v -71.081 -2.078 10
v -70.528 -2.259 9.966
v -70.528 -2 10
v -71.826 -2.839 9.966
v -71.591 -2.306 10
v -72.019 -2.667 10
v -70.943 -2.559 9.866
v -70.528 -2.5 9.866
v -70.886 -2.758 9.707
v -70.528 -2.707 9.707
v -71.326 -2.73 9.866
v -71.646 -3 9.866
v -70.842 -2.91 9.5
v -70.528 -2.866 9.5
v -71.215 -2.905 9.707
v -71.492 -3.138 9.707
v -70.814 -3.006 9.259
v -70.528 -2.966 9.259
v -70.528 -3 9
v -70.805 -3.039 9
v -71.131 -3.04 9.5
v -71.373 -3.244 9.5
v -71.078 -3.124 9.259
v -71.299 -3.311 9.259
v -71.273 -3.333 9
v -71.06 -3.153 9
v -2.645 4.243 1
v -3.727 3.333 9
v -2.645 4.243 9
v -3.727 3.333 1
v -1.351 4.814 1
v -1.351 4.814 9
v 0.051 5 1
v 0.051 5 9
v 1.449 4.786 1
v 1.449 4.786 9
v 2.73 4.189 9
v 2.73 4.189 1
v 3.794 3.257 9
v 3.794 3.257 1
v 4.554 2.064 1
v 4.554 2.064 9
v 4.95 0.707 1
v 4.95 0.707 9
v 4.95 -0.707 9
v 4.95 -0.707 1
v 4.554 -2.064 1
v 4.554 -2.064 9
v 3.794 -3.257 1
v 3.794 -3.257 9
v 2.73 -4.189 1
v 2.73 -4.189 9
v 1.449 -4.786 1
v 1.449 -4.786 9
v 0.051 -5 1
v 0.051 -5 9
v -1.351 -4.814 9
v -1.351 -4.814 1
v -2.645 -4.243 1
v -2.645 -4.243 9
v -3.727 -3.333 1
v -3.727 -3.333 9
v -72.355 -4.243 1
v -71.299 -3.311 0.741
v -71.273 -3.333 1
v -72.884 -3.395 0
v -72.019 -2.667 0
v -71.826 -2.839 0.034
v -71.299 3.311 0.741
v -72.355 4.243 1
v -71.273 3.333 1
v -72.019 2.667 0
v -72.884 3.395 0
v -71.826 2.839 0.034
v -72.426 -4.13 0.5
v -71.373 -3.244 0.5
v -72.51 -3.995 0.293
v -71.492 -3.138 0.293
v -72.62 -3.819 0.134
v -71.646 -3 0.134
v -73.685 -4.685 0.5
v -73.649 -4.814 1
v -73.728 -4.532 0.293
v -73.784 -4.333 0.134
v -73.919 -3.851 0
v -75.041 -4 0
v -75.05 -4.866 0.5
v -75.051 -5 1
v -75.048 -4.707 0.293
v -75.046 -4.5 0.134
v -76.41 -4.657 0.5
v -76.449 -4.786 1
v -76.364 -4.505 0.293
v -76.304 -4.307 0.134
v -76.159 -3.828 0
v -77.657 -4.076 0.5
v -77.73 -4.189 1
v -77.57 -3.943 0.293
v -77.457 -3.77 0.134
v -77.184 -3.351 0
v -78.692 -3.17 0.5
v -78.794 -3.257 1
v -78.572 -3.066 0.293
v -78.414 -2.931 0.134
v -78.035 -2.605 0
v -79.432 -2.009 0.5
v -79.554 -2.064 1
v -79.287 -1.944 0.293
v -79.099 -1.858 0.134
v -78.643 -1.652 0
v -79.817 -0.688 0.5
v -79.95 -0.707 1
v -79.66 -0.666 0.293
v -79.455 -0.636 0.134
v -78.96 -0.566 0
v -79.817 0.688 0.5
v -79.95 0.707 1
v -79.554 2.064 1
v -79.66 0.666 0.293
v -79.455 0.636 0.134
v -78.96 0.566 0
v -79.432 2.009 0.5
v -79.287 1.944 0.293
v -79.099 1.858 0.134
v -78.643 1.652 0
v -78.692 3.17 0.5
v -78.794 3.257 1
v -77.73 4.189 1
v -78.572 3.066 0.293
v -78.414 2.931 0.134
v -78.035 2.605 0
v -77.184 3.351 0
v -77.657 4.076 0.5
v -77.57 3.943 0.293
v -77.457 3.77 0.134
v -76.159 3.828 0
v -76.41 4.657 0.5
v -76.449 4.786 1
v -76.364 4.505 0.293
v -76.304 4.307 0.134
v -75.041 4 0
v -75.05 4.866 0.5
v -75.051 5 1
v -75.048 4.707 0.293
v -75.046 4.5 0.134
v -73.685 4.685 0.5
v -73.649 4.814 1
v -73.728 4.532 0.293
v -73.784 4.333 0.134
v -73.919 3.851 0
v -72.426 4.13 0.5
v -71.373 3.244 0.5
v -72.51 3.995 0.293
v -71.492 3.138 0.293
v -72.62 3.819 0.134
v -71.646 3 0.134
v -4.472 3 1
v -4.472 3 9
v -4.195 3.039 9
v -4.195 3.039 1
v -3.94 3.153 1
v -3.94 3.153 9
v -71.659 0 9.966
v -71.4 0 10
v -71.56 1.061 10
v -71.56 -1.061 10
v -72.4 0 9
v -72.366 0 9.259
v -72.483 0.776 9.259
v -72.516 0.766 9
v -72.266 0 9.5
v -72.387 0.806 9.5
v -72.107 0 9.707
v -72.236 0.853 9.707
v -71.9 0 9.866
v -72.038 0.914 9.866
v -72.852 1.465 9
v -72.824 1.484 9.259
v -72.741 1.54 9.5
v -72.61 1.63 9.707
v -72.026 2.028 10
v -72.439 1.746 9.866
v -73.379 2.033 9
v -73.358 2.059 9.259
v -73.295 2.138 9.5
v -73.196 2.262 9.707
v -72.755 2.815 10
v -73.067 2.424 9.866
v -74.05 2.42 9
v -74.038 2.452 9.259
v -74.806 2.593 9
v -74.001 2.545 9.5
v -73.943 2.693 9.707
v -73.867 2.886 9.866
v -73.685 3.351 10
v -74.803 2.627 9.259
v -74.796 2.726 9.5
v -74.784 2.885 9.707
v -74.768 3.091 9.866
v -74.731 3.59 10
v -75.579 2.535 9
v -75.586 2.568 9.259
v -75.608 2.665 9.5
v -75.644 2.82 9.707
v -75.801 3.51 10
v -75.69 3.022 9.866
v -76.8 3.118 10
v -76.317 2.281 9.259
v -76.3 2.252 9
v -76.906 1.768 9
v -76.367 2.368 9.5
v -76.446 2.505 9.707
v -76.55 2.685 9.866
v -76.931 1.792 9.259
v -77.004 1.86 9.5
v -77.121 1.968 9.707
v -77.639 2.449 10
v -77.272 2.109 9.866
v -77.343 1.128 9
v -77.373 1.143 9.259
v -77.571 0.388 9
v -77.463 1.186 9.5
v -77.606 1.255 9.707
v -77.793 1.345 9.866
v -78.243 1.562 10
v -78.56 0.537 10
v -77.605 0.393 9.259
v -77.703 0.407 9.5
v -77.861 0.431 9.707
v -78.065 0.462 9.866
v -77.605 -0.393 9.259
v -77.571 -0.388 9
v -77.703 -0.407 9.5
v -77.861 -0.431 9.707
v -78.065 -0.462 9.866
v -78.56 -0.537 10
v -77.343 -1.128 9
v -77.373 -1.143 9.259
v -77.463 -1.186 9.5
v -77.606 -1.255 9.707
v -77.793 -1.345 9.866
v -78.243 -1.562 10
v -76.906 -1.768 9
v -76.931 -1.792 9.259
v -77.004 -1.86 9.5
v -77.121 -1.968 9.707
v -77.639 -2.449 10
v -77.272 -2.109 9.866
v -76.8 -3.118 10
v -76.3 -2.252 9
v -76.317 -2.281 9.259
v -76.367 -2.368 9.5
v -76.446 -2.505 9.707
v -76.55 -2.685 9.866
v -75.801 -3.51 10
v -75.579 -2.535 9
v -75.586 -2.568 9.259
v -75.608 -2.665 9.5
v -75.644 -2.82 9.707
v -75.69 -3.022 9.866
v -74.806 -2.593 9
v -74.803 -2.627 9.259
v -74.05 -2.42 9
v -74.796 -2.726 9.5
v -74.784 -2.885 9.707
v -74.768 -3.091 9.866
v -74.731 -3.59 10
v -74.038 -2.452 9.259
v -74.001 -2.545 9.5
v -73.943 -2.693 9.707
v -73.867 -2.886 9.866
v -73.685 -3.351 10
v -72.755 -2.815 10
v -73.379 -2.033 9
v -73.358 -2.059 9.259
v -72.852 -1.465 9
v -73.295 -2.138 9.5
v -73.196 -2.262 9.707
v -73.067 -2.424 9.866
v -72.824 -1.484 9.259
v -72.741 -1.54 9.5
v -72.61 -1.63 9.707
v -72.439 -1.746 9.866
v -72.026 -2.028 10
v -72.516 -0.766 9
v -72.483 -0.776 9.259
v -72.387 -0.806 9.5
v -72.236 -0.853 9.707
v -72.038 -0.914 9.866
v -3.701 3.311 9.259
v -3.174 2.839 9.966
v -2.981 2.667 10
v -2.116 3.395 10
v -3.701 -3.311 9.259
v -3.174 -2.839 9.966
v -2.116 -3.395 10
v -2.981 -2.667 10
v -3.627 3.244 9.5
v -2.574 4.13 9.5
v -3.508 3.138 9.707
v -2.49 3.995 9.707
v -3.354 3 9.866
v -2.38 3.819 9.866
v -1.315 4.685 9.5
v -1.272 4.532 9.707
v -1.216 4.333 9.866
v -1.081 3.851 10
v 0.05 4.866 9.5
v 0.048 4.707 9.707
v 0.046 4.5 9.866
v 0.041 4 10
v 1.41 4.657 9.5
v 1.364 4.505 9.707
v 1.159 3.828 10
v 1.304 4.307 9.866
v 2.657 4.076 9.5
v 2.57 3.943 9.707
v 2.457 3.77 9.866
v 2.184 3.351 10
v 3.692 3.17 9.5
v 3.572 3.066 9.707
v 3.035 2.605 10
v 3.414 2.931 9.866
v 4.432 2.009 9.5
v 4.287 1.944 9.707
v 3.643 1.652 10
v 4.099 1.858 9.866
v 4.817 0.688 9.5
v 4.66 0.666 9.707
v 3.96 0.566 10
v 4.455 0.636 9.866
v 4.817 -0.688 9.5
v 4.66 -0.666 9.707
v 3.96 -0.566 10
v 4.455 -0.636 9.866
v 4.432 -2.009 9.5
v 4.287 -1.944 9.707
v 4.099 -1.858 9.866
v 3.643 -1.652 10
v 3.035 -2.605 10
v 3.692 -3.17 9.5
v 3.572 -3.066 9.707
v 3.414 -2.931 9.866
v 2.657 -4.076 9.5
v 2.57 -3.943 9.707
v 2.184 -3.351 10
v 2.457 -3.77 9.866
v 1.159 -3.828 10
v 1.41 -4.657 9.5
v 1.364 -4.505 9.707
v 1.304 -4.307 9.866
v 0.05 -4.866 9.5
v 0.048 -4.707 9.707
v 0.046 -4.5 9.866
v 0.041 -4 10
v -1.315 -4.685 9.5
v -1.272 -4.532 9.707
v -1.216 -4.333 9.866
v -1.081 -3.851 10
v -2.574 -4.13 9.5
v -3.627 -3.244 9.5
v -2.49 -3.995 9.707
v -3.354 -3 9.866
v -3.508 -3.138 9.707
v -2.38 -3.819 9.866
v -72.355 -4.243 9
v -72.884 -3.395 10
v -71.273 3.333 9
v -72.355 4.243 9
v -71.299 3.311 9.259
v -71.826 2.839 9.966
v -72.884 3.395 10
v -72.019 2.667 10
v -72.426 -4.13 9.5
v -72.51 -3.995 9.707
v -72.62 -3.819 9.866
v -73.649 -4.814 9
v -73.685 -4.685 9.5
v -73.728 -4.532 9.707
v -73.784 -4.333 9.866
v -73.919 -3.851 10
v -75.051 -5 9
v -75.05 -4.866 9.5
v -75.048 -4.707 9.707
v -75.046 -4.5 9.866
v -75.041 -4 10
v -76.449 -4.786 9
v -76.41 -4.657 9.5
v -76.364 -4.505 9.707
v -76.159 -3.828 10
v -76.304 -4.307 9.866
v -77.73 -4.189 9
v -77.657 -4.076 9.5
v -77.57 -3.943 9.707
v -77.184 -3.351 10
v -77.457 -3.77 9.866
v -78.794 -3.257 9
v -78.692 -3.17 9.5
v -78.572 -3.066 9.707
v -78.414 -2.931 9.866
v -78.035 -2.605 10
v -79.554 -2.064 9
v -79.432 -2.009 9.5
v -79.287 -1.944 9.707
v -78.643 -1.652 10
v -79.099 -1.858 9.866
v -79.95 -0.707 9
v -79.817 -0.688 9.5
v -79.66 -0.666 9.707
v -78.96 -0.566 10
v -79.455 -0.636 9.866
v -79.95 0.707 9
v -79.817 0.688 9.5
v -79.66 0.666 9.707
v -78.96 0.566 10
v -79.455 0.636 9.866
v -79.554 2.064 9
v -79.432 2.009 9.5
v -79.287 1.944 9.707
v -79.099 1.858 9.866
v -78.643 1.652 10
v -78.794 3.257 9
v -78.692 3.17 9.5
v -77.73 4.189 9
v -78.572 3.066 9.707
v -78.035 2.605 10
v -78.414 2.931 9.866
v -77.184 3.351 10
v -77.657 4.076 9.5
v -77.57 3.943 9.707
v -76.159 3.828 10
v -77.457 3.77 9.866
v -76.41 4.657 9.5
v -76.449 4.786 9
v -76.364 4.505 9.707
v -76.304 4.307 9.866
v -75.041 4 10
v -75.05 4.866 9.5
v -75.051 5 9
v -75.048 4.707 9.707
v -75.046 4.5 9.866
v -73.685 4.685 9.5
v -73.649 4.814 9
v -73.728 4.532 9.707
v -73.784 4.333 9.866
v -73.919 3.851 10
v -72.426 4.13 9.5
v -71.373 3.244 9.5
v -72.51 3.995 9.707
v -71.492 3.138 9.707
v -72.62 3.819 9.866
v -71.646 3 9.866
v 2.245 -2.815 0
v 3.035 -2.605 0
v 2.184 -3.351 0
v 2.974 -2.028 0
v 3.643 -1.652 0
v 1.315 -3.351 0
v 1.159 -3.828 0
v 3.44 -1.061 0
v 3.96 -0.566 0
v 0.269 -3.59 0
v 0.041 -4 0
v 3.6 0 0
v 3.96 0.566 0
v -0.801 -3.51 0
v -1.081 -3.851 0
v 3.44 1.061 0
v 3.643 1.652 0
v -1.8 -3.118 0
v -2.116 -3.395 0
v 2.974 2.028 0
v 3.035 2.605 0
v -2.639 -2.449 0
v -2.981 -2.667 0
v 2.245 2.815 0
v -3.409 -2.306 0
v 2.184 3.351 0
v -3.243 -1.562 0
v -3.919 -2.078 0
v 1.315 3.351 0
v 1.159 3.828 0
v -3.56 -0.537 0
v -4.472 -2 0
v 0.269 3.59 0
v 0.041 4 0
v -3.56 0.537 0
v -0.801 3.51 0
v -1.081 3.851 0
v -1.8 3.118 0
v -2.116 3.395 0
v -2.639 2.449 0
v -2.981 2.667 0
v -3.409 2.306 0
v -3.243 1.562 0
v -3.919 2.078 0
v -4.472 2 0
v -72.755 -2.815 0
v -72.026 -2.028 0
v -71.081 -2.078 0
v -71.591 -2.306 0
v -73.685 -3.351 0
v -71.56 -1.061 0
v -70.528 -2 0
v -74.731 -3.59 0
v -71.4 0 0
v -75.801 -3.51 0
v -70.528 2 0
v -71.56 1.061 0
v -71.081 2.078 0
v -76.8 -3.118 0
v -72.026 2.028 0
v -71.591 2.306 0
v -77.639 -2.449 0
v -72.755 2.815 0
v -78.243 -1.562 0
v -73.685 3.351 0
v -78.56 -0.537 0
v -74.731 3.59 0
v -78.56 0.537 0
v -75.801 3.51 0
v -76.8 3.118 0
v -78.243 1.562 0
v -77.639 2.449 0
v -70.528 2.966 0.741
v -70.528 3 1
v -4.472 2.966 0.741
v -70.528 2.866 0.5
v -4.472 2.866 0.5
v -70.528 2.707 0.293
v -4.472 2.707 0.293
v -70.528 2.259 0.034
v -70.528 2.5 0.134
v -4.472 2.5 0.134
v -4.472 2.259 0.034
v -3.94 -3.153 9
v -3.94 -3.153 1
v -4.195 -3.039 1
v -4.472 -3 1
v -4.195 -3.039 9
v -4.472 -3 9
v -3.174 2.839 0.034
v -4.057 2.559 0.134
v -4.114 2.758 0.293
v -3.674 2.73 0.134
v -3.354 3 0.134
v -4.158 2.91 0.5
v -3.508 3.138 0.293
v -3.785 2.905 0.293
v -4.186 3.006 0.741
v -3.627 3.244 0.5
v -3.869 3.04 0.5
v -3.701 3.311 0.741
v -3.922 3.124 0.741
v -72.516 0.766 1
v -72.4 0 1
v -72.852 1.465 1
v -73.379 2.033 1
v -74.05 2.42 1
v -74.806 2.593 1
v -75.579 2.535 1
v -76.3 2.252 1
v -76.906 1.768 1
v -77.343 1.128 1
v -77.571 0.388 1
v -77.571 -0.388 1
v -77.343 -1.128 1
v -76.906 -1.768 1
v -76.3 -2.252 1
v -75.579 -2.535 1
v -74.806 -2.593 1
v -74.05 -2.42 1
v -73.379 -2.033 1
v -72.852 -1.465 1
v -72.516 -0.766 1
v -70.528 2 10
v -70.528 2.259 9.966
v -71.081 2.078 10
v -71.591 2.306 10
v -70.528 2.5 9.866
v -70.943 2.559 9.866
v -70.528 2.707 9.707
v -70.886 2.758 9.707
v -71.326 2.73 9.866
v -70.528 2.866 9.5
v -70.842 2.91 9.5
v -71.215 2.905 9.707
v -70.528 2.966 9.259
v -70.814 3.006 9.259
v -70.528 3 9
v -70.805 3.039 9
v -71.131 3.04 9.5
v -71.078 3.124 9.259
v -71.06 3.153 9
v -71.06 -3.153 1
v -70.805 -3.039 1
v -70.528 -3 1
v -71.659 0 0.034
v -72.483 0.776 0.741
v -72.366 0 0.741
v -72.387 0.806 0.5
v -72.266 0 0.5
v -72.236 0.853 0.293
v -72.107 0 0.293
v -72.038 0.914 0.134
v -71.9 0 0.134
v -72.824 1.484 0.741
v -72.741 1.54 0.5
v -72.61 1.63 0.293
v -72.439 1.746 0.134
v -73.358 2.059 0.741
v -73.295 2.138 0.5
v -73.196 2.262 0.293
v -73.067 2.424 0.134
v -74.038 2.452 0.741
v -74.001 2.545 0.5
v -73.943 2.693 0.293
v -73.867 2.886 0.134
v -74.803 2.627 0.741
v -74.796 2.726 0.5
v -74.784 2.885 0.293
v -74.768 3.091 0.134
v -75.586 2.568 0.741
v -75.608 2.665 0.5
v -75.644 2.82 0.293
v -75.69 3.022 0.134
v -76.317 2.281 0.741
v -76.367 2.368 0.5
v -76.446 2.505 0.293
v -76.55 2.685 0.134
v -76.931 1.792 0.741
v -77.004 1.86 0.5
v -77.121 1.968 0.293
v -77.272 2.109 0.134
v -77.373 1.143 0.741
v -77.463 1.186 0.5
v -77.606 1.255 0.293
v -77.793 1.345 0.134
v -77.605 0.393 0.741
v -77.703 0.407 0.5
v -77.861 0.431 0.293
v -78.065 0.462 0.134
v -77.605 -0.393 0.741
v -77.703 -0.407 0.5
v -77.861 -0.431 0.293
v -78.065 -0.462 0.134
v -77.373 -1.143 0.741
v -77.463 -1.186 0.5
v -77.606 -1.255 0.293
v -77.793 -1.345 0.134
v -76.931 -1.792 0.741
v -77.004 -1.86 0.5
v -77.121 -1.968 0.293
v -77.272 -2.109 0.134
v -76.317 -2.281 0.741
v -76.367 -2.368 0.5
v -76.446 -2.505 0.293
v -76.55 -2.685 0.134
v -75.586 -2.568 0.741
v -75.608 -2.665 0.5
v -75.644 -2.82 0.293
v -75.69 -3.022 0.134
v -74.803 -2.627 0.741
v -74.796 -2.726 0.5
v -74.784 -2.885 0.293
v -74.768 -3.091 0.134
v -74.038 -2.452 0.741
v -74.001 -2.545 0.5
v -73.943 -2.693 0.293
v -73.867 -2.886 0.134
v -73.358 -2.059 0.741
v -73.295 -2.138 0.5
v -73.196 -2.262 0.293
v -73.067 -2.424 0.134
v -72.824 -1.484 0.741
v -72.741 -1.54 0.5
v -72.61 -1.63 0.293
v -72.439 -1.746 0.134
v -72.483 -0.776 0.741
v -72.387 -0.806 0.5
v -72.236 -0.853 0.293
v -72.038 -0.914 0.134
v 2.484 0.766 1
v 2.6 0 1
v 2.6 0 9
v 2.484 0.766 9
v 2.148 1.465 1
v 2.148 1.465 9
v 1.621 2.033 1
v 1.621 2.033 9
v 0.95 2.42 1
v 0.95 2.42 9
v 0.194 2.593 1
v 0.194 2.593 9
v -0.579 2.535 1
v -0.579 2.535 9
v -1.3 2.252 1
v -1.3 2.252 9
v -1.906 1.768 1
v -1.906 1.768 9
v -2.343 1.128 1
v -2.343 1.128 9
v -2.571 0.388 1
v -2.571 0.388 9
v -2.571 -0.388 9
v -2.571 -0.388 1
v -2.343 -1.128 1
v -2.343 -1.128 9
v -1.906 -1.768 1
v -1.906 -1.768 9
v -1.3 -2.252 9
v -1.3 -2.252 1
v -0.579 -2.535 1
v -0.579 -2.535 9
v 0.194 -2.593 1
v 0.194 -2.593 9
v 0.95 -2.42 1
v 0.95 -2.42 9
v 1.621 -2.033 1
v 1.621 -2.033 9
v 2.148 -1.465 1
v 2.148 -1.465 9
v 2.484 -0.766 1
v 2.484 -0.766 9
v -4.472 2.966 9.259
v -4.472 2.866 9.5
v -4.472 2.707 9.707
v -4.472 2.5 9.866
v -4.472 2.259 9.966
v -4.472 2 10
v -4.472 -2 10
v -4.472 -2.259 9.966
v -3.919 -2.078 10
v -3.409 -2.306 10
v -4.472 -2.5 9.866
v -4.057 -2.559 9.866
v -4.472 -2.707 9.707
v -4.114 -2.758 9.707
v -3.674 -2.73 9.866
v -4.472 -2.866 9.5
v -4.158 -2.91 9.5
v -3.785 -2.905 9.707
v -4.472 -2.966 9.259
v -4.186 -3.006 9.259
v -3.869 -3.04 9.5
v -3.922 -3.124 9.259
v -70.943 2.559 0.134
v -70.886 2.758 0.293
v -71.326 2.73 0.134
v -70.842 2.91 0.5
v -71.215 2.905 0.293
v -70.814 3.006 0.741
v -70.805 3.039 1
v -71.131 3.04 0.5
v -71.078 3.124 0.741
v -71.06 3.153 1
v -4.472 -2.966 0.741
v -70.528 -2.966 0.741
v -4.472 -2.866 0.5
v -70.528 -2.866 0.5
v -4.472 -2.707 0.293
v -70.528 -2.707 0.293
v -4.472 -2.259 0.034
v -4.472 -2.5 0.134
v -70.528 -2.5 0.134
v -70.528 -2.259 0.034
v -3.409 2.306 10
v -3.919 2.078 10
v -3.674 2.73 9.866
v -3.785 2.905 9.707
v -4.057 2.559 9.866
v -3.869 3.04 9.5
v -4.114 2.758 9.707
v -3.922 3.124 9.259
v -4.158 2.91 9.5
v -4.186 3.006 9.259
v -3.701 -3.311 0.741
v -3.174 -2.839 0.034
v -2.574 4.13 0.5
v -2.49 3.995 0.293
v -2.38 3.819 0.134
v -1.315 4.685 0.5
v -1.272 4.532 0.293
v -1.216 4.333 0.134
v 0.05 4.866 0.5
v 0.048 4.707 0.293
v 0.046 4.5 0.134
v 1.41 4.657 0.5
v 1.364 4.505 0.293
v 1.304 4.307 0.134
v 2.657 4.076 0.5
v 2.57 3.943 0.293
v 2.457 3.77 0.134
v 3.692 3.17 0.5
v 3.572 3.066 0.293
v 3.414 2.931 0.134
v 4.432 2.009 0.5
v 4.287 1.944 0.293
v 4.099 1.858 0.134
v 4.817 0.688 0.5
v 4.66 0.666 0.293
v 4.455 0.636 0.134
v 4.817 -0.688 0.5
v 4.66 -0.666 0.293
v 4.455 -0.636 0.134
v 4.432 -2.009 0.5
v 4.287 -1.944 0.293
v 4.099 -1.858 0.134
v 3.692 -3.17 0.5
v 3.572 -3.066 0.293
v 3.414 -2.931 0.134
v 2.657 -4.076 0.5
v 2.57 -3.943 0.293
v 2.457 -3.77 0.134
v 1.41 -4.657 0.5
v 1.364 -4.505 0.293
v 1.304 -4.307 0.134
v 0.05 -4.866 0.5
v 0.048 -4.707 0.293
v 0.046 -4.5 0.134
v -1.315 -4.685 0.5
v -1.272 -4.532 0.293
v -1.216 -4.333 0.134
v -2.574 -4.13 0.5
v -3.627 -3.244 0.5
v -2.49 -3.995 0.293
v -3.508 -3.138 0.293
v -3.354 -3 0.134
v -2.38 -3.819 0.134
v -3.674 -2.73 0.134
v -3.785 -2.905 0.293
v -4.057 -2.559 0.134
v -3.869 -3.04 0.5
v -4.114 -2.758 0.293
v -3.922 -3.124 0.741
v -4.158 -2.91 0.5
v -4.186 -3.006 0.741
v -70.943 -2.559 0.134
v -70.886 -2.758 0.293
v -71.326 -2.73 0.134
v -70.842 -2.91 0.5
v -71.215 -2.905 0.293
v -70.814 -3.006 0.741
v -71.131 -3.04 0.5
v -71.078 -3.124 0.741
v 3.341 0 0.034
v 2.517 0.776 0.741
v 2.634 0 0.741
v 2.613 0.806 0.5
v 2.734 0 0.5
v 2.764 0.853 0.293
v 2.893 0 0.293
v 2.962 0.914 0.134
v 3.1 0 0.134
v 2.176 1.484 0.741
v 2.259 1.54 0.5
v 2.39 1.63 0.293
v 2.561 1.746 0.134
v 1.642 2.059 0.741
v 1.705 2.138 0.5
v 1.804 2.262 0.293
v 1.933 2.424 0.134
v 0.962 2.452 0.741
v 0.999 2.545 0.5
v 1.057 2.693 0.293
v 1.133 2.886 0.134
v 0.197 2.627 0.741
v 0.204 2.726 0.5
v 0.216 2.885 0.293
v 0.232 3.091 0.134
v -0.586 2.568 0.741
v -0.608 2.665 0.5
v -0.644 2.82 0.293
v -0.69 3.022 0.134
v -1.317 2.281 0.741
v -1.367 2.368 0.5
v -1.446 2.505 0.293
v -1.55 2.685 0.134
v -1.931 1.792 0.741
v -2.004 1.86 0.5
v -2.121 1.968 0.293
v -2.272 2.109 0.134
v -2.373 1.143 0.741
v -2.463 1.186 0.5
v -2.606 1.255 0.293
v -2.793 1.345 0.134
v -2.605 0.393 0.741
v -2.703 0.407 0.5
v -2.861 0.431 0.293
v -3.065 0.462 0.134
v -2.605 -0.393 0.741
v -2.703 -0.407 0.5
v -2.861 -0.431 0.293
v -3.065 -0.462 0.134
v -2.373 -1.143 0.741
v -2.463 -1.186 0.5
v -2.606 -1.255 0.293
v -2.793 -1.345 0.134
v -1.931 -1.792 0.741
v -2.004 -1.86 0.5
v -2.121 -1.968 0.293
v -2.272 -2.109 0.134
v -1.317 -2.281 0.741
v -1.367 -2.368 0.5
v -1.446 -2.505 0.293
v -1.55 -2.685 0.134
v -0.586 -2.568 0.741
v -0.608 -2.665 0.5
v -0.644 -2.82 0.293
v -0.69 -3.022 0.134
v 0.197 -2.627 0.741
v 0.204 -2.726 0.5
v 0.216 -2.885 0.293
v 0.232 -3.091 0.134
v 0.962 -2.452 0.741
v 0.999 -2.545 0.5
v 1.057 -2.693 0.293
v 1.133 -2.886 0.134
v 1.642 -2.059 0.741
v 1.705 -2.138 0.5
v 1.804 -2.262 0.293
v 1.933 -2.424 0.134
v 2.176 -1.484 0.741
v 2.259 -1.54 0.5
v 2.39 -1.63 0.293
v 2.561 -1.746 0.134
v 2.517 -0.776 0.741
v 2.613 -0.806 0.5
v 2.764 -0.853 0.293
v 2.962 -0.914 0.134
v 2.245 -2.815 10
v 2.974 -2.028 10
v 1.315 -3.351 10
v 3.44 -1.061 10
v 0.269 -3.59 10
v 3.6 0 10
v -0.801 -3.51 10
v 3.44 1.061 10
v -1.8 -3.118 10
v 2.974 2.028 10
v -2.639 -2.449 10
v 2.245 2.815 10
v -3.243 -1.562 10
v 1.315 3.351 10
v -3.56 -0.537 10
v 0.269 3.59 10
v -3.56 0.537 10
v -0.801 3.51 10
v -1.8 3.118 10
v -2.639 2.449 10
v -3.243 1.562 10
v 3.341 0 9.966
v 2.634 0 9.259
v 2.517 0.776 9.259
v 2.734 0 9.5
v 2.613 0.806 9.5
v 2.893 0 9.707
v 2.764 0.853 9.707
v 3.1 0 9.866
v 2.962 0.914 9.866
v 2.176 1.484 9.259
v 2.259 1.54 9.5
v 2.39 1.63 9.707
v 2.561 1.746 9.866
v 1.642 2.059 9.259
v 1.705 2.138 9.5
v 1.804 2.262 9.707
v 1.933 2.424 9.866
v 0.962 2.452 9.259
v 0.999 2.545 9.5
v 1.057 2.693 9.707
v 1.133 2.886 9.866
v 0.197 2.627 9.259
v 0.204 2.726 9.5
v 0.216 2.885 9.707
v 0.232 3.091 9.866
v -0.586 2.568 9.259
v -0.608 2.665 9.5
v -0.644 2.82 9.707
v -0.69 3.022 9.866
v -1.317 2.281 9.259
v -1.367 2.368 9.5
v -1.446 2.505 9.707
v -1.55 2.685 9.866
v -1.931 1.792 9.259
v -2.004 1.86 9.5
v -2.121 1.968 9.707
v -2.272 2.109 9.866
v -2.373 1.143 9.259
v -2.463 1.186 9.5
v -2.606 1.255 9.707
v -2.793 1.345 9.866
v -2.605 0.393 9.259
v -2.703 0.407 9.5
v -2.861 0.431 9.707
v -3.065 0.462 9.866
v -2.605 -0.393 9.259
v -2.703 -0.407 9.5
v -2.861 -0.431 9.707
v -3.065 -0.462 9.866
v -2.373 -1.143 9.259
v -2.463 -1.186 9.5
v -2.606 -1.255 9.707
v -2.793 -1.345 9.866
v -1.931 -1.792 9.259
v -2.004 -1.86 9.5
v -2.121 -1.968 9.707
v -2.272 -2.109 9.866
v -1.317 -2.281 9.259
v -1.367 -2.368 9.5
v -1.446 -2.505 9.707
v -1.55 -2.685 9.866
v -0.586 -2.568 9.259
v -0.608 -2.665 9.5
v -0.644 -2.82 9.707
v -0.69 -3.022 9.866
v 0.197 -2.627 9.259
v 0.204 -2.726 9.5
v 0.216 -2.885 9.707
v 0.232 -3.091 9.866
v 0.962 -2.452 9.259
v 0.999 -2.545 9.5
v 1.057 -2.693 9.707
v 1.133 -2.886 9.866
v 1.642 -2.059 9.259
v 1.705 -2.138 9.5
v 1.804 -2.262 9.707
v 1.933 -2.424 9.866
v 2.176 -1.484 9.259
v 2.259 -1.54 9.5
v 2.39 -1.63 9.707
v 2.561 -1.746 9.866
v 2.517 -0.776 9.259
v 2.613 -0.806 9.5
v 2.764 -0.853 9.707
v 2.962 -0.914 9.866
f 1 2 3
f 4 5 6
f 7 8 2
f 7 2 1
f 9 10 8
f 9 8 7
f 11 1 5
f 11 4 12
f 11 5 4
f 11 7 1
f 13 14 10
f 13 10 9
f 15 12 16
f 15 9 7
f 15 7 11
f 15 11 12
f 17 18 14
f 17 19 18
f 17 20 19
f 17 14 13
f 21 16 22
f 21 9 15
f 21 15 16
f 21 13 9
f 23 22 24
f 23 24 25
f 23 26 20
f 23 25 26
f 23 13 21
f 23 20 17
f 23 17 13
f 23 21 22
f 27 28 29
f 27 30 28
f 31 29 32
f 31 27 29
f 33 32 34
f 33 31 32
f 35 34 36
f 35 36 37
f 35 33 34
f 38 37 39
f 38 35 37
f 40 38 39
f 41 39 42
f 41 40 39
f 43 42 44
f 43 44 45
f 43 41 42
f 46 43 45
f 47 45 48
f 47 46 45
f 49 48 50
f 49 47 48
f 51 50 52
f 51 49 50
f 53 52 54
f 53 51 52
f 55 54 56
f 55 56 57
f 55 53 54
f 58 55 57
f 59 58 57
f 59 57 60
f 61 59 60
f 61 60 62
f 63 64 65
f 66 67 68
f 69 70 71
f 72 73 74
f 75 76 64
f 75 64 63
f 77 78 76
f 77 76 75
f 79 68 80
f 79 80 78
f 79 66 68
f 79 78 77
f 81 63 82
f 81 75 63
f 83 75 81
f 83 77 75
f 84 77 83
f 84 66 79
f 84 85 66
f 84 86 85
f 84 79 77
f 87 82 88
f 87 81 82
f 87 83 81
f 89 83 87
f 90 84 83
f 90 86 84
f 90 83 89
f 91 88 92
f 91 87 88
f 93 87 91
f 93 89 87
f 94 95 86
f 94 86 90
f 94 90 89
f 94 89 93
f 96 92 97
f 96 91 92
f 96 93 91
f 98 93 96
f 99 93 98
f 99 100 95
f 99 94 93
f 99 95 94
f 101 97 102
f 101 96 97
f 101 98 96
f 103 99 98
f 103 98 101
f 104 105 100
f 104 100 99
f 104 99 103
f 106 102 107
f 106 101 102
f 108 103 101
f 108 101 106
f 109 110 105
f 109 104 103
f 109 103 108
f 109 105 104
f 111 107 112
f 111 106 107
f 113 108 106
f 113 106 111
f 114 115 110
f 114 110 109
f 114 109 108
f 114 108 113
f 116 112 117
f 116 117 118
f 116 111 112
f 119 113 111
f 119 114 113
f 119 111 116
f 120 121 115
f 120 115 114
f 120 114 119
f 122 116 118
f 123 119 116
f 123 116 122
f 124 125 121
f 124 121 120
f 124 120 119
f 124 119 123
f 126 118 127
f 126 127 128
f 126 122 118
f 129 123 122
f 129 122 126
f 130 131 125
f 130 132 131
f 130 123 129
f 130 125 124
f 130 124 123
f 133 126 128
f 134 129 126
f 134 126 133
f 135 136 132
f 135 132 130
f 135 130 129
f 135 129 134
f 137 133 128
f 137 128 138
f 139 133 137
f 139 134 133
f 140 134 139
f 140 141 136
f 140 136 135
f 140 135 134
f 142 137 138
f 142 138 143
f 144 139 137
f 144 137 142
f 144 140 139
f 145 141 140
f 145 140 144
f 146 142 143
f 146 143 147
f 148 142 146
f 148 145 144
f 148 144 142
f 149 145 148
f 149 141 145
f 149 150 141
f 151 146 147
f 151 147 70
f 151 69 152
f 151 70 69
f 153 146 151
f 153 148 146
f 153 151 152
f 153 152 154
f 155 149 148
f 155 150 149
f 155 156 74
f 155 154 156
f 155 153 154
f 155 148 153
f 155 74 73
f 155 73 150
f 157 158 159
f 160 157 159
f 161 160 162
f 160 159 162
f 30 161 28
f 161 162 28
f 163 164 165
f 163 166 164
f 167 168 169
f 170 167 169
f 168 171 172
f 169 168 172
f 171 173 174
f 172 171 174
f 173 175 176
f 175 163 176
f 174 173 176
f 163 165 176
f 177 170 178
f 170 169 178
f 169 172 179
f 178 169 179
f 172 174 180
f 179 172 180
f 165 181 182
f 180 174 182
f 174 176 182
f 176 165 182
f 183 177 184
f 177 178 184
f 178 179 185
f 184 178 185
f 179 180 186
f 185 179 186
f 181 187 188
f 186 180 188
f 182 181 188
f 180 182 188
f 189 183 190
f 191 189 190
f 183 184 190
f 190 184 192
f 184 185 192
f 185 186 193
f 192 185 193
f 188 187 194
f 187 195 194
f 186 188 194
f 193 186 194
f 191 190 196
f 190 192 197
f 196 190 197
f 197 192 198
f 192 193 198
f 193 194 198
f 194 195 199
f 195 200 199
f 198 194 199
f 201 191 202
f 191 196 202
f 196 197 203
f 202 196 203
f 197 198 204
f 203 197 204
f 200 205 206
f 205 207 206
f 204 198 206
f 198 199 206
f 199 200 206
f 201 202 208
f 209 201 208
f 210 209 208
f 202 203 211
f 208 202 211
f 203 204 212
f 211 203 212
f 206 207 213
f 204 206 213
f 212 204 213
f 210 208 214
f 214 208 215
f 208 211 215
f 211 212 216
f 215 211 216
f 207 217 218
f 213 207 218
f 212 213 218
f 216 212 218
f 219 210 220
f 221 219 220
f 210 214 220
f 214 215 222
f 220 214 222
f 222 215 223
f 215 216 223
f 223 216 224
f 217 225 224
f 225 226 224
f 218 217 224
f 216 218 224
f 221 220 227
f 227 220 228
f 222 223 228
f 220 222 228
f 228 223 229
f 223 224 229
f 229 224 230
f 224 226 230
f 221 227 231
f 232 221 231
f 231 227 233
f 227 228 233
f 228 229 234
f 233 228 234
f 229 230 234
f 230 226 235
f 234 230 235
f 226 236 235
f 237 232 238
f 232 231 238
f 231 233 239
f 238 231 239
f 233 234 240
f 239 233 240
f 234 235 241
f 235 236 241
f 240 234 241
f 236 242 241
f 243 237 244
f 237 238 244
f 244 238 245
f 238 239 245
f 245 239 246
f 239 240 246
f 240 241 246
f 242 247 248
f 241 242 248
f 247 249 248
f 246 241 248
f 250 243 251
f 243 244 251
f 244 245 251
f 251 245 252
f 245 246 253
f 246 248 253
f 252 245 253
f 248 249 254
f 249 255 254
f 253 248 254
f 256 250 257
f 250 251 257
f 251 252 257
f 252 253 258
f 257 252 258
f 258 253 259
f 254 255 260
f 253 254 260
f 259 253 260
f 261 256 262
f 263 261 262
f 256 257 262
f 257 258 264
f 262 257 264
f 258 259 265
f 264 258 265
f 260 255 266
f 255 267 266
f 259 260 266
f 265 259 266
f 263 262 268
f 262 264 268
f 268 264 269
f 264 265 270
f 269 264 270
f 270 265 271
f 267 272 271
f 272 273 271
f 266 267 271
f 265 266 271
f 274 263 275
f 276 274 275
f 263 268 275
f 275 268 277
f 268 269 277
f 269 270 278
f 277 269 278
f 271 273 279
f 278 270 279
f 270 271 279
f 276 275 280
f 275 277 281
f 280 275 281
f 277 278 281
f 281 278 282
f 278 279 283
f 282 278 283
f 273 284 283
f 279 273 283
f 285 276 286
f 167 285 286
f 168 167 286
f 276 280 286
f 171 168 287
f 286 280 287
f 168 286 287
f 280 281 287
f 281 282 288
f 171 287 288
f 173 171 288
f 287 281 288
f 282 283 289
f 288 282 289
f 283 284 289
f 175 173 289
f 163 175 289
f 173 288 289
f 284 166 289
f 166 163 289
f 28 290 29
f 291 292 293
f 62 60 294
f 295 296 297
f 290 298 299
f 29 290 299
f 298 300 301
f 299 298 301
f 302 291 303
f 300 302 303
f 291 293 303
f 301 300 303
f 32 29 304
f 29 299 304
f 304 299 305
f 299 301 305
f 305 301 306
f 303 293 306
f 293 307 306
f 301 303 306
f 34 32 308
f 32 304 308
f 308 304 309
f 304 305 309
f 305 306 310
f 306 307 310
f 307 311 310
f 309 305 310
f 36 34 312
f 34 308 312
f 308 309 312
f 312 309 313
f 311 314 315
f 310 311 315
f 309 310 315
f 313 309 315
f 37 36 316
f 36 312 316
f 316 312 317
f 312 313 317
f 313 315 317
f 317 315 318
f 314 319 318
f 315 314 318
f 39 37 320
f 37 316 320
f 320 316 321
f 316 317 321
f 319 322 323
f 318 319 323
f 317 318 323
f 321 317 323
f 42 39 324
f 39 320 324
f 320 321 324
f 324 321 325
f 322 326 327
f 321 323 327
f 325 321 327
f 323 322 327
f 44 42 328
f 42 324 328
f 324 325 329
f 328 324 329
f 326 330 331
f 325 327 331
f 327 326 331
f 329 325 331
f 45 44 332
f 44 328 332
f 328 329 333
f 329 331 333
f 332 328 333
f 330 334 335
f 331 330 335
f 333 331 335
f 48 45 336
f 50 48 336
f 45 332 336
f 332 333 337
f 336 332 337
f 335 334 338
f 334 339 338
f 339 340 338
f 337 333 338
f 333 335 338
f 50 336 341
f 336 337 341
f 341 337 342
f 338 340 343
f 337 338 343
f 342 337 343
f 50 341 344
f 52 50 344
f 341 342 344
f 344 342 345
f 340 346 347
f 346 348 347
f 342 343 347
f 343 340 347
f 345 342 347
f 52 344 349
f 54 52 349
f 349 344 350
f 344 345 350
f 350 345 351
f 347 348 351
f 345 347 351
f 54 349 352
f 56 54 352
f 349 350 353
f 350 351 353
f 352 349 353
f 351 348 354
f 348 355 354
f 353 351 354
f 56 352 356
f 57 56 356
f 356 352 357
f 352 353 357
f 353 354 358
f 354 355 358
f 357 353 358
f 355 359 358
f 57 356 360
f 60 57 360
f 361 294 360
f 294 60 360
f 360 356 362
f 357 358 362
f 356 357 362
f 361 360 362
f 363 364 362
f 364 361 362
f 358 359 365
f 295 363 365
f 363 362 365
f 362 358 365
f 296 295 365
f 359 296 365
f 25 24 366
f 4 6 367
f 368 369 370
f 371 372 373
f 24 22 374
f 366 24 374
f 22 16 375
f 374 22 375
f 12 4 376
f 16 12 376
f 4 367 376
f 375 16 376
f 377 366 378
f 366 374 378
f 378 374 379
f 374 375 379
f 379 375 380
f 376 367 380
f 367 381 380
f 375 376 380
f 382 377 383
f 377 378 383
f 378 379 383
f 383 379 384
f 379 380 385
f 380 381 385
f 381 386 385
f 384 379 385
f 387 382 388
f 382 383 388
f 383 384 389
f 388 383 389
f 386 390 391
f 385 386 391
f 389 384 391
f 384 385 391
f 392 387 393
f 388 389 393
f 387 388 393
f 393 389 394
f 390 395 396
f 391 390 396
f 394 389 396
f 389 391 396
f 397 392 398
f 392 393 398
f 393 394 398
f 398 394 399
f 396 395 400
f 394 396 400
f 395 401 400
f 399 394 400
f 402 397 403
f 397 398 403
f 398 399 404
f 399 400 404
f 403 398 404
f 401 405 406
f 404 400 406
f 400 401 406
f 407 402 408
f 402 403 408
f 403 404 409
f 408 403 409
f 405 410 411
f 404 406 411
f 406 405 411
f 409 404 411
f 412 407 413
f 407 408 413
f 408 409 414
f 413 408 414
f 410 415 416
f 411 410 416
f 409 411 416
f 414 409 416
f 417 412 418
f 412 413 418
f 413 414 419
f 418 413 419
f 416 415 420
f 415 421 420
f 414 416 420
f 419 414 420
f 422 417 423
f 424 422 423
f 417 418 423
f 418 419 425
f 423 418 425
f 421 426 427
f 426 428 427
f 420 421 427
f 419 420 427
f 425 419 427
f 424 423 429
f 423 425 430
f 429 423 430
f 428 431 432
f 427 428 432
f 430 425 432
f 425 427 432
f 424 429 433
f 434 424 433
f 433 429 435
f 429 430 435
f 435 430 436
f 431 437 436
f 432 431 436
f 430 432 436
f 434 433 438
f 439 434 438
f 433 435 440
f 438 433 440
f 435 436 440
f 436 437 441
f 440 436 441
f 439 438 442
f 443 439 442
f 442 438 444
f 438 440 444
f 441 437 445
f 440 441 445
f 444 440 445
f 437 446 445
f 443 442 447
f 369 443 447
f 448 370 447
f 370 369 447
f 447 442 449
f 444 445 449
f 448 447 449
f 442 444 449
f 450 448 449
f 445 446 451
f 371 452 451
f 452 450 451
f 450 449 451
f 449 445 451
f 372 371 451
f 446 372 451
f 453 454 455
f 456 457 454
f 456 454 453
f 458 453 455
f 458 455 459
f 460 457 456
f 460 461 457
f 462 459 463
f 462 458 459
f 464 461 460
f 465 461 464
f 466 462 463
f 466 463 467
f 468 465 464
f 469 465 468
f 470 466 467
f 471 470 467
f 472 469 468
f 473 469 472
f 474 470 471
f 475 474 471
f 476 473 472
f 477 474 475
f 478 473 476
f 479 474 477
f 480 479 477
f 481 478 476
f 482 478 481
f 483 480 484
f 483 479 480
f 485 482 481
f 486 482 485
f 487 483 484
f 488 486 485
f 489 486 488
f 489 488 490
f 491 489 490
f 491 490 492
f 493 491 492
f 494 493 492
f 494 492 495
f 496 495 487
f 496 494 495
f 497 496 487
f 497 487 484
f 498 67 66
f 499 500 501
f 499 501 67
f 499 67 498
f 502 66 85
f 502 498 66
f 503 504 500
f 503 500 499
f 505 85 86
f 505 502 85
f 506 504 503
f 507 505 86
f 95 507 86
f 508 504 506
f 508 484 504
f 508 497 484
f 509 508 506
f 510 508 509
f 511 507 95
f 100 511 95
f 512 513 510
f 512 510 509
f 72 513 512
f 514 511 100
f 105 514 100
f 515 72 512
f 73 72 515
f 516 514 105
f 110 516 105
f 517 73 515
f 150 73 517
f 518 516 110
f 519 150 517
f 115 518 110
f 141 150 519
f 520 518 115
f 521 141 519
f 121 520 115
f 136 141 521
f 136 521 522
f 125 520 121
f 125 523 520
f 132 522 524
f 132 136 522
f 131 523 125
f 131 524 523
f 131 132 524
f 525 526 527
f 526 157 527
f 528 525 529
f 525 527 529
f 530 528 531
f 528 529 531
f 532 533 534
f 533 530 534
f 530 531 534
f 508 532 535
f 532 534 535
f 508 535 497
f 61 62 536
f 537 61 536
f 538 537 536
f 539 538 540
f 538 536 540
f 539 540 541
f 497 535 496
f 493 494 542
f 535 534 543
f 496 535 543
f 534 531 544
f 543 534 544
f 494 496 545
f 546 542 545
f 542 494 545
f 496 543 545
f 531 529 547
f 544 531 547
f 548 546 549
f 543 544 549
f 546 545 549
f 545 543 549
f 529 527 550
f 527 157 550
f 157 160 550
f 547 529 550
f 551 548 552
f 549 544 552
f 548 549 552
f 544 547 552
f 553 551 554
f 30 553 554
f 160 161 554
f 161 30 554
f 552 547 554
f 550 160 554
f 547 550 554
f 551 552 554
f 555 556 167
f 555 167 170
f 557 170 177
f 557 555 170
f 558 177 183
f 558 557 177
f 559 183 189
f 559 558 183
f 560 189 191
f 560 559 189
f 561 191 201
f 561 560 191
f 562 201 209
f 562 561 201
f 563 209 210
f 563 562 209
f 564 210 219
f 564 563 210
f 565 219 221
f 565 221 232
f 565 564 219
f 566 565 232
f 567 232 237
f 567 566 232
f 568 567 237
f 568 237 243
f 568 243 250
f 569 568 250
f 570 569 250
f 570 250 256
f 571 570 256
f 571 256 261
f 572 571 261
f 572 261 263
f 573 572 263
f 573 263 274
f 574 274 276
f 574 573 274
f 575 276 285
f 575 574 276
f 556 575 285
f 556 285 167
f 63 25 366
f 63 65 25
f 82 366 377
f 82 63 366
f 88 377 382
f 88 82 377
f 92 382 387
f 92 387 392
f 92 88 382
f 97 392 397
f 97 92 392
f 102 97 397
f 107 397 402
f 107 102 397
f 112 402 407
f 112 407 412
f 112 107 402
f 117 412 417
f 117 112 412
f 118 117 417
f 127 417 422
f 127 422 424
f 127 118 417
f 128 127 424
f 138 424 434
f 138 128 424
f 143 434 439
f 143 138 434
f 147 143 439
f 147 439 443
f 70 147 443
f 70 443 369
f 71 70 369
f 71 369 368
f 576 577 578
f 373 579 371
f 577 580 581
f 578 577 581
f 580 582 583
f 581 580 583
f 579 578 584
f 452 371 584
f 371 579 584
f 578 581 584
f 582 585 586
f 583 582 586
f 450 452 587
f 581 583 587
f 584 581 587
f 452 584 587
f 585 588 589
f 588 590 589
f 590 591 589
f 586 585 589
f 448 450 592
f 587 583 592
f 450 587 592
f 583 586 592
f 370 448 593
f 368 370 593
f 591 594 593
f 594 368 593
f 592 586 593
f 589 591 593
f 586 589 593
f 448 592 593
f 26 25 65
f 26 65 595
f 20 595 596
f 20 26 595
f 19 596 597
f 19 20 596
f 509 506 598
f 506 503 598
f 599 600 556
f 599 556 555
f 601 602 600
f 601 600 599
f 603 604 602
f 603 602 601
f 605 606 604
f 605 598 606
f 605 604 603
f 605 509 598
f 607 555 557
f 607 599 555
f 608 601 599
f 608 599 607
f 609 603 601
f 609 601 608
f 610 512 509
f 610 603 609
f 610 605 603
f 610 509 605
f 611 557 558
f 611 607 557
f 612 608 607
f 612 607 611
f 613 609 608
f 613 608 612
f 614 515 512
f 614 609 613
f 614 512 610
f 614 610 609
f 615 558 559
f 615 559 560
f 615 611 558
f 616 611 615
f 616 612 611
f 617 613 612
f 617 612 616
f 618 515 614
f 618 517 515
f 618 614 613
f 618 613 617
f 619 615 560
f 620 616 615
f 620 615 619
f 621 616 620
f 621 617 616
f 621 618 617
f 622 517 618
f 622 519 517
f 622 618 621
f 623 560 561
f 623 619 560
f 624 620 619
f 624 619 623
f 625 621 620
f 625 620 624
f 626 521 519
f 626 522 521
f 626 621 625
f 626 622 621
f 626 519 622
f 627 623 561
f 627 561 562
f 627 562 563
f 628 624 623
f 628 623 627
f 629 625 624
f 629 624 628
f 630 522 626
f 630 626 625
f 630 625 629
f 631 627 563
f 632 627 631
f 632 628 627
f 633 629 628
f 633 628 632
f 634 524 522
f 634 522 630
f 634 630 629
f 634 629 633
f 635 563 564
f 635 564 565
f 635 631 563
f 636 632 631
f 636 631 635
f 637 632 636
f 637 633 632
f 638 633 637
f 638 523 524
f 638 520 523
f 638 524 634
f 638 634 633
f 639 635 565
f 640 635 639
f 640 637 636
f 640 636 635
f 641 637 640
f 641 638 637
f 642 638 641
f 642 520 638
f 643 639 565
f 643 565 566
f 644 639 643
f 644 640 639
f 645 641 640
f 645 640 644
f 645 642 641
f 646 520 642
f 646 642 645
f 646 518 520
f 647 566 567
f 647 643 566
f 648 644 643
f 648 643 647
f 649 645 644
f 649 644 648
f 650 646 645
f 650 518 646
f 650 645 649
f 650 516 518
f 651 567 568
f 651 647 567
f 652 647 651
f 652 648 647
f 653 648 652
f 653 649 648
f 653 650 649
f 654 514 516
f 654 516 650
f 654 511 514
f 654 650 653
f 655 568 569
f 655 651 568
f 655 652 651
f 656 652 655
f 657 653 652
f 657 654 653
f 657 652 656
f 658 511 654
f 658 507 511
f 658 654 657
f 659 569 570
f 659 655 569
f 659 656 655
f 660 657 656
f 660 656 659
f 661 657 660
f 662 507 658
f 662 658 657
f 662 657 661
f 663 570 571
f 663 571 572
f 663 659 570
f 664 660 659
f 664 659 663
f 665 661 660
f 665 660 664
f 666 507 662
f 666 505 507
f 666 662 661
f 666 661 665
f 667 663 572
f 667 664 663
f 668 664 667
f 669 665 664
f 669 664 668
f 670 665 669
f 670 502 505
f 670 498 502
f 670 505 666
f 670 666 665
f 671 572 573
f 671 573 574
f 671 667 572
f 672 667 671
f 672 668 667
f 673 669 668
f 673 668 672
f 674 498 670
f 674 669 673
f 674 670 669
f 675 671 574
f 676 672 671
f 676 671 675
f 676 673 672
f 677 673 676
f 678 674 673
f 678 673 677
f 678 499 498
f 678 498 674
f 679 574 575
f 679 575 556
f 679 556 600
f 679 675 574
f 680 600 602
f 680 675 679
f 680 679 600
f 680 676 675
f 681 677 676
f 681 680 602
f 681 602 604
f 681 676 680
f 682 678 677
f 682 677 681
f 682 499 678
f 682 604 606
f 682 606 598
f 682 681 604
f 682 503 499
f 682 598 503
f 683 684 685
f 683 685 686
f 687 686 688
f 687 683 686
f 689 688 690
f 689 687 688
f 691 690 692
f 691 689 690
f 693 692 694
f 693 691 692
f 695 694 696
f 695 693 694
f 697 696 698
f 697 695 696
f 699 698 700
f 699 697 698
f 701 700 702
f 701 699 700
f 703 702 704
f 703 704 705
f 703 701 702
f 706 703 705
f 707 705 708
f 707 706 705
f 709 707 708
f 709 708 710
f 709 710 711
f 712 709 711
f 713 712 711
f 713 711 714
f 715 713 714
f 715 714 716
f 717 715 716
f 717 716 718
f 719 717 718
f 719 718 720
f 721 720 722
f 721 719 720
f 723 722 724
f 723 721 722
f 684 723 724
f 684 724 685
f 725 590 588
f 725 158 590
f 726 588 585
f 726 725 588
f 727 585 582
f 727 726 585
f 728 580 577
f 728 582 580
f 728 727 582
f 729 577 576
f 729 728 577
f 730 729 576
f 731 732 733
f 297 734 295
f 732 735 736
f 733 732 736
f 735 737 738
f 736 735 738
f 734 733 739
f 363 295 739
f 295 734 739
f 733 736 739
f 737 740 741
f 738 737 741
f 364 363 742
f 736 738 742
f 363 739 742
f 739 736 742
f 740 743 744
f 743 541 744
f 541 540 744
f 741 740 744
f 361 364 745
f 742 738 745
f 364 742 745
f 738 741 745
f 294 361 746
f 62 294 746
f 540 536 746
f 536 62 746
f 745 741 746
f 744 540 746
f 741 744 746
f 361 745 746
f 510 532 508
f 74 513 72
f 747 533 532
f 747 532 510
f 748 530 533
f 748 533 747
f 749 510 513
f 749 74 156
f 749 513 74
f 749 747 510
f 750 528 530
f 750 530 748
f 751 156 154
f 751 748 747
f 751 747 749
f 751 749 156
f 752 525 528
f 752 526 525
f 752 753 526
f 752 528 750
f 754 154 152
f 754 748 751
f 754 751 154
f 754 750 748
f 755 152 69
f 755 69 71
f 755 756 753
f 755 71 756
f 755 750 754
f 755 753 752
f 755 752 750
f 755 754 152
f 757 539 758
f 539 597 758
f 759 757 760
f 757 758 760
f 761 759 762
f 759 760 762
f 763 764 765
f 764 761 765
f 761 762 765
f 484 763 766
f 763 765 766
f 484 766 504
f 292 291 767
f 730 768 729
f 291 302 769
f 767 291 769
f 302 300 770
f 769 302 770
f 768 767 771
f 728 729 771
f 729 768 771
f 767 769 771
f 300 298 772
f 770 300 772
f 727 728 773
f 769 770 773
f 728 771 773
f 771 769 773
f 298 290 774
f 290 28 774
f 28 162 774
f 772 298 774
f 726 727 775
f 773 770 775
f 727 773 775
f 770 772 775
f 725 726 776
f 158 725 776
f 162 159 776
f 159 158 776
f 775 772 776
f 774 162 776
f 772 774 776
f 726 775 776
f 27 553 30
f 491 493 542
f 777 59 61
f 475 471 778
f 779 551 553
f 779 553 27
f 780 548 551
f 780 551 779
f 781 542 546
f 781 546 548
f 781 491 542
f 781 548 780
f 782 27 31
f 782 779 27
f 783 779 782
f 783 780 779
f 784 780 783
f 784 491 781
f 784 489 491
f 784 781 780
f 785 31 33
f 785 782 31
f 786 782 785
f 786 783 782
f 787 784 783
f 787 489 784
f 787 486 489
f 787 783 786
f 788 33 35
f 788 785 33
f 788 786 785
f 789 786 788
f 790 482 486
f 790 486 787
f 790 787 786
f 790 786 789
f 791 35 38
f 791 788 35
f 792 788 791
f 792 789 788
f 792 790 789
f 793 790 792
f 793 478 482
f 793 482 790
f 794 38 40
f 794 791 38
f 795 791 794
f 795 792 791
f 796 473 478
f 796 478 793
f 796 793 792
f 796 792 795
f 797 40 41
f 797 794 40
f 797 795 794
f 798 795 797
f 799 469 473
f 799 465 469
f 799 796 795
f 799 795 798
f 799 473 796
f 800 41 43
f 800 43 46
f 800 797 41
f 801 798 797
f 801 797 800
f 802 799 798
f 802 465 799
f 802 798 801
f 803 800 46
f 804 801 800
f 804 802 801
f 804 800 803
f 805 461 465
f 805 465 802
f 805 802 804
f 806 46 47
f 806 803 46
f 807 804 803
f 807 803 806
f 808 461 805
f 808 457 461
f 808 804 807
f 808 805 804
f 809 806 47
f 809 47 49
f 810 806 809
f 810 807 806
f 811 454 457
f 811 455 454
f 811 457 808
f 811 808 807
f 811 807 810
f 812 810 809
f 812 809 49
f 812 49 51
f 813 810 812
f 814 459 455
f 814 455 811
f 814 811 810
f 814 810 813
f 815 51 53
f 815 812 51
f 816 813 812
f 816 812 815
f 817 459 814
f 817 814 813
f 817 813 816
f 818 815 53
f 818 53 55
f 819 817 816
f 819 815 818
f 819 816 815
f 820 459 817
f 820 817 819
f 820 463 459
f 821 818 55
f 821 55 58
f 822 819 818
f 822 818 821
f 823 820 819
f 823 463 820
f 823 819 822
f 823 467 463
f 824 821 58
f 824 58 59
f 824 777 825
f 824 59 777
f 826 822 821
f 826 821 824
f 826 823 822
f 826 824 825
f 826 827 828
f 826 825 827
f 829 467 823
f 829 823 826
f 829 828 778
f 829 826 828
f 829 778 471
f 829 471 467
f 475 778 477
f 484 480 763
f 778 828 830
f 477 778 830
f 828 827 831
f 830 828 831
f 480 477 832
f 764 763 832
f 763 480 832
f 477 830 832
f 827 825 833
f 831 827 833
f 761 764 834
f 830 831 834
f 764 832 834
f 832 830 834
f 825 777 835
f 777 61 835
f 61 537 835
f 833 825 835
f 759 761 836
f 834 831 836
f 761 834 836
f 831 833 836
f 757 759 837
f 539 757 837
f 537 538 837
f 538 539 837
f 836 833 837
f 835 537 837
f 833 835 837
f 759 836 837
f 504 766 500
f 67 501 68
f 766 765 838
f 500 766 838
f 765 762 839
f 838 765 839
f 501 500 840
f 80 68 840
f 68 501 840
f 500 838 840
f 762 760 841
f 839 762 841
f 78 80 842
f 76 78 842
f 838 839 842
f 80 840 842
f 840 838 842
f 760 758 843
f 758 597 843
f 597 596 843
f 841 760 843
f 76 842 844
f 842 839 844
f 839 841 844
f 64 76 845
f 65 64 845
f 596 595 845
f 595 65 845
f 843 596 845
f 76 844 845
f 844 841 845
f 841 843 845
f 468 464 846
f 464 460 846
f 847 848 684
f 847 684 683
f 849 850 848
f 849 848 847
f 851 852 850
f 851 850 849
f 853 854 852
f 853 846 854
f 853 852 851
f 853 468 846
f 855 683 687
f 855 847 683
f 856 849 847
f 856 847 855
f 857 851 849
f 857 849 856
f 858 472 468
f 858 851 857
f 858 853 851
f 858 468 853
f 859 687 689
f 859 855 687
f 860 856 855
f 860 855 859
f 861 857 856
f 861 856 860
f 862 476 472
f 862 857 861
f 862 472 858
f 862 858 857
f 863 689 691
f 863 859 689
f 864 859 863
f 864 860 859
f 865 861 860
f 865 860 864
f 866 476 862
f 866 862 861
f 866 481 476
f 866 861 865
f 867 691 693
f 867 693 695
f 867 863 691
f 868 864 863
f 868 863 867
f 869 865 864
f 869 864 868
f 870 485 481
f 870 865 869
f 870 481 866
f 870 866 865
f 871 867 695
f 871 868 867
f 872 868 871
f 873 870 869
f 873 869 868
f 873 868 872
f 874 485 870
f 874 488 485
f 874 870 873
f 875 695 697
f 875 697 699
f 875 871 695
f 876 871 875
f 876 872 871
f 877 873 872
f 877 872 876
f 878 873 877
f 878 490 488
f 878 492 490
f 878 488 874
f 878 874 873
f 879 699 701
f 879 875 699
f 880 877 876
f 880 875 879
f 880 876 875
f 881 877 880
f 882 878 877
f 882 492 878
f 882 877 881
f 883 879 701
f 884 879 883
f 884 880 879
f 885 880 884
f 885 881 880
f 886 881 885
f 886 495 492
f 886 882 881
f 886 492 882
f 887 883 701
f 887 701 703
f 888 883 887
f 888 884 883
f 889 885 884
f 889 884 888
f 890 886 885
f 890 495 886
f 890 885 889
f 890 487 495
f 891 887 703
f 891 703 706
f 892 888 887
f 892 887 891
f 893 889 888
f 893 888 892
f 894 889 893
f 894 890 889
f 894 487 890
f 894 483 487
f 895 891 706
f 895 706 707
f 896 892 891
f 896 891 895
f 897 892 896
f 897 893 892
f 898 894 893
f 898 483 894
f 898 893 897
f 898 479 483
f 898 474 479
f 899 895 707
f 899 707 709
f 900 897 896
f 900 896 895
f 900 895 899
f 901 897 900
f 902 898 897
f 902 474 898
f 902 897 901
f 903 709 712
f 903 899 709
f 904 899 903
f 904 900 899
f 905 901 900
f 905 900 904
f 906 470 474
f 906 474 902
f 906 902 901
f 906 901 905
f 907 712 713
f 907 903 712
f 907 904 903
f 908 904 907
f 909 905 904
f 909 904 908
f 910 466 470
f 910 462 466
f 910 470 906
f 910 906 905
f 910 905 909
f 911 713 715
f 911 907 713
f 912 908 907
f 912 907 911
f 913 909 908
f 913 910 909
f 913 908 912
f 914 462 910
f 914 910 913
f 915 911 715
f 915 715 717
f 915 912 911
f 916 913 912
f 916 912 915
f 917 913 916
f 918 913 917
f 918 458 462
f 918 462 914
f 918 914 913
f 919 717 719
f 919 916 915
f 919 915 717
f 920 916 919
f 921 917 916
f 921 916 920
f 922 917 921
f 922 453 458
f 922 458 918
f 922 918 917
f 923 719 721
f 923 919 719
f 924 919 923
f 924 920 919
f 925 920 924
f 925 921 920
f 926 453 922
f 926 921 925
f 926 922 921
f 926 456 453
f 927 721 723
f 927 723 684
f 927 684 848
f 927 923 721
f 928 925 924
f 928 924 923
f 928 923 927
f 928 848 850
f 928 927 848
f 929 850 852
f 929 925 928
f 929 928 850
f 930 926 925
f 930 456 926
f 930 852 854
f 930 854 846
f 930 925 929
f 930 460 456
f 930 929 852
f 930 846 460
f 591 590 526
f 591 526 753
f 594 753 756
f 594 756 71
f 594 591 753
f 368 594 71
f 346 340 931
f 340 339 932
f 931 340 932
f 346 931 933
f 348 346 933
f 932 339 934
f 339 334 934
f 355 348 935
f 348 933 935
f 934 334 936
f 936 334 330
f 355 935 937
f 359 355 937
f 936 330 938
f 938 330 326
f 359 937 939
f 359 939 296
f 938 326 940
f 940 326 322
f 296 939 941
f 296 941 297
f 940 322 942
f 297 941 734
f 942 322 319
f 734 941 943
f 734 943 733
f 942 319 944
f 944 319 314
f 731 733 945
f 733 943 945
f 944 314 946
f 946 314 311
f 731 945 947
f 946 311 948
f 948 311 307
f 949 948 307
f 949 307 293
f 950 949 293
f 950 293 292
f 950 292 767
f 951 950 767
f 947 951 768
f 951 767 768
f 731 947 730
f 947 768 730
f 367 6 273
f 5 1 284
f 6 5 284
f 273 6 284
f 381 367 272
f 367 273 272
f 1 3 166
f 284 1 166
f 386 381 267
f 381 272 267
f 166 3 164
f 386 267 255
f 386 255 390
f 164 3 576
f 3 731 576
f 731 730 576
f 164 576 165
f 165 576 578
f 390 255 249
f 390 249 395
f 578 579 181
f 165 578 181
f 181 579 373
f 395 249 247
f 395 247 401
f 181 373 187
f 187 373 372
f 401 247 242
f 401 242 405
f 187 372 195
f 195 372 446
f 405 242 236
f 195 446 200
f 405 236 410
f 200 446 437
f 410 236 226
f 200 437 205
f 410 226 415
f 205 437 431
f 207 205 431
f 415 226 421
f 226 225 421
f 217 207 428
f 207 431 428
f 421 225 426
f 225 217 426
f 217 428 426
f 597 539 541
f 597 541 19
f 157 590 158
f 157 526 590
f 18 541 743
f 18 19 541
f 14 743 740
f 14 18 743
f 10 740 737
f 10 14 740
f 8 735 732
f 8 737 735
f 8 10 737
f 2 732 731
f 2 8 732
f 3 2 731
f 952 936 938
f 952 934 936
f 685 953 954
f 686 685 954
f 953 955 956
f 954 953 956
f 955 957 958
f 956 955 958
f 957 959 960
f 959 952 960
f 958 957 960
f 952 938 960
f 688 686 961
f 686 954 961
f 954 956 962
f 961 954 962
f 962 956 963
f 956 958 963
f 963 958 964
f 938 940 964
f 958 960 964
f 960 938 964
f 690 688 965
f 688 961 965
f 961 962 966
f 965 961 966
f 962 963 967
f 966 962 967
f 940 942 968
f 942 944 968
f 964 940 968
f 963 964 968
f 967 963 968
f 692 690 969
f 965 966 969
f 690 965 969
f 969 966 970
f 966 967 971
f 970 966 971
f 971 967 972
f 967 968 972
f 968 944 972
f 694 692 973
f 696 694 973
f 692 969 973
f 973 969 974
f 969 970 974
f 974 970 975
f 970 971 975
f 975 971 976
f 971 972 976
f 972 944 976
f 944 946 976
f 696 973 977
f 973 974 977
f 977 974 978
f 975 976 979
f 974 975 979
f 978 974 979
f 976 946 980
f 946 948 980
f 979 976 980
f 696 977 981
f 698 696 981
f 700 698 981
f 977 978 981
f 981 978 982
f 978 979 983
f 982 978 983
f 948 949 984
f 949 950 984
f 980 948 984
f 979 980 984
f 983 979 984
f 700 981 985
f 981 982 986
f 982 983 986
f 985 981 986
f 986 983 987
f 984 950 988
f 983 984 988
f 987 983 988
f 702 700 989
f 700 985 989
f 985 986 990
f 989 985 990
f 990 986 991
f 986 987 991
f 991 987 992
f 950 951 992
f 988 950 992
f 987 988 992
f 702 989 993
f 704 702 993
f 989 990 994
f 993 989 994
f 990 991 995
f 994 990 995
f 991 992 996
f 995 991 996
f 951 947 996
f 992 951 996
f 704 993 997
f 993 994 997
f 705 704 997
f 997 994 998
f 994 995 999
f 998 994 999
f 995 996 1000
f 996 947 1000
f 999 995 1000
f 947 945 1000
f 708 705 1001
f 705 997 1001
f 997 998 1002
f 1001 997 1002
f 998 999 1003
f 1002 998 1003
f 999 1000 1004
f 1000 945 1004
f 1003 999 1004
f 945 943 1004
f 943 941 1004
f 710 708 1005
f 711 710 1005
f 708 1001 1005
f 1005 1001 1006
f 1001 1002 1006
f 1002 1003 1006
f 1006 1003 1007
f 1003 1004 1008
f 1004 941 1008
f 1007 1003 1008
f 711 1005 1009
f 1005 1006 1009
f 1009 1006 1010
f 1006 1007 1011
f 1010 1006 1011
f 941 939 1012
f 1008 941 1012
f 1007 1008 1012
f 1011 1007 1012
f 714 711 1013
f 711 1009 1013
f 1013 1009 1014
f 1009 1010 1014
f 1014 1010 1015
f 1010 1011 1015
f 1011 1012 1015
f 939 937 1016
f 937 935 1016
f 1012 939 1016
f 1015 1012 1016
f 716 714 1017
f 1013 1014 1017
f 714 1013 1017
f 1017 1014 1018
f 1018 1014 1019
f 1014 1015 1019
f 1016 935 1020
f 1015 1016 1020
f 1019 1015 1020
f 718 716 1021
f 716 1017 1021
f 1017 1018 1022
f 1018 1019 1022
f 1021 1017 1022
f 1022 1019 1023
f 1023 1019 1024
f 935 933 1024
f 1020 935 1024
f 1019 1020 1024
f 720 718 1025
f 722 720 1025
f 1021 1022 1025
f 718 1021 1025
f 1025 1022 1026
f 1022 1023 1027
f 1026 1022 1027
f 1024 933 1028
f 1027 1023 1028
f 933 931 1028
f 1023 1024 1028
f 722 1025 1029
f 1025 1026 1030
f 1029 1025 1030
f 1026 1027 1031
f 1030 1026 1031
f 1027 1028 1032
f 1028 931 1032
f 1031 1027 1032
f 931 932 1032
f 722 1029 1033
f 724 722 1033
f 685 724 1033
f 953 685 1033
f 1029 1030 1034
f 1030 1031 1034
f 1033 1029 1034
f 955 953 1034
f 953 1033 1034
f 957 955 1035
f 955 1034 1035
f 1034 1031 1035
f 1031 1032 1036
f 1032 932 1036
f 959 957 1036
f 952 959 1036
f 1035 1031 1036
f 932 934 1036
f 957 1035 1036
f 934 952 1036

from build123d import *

# Parameters (mm, degrees)
SKETCH1_R           = 2.6
BOSS_EXTRUDE1_DEPTH = 10
FILLET1_R           = 1


with BuildPart() as part:
    # Sketch1 → Boss-Extrude1 (new body)
    with BuildSketch(Plane.XY):
        with BuildLine():
            Line((-71, 3), (-4, 3))
            ThreePointArc((-4, 3), (5, 0), (-4, -3))
            Line((-4, -3), (-71, -3))
            ThreePointArc((-71, -3), (-80, 0), (-71, 3))
        make_face()
        with Locations((-75, 0)):
            Circle(SKETCH1_R, mode=Mode.SUBTRACT)
        Circle(SKETCH1_R, mode=Mode.SUBTRACT)
    extrude(amount=BOSS_EXTRUDE1_DEPTH)

    # Fillet1
    fillet1_edges = [part.edges().sort_by_distance(p)[0] for p in [
        (-77.6, 0, 0),
        (-77.6, 0, 10),
        (5, 0, 10),
        (-2.6, 0, 0),
        (-2.6, 0, 10),
        (-37.5, 3, 10),
        (-80, 0, 10),
        (-37.5, 3, 0),
        (5, 0, 0),
        (-37.5, -3, 0),
        (-80, 0, 0),
        (-71, 3, 5),
        (-4, 3, 5),
        (-4, -3, 5),
        (-71, -3, 5),
        (-37.5, -3, 10),
    ]]
    fillet(fillet1_edges, radius=FILLET1_R)


solid = part.part
